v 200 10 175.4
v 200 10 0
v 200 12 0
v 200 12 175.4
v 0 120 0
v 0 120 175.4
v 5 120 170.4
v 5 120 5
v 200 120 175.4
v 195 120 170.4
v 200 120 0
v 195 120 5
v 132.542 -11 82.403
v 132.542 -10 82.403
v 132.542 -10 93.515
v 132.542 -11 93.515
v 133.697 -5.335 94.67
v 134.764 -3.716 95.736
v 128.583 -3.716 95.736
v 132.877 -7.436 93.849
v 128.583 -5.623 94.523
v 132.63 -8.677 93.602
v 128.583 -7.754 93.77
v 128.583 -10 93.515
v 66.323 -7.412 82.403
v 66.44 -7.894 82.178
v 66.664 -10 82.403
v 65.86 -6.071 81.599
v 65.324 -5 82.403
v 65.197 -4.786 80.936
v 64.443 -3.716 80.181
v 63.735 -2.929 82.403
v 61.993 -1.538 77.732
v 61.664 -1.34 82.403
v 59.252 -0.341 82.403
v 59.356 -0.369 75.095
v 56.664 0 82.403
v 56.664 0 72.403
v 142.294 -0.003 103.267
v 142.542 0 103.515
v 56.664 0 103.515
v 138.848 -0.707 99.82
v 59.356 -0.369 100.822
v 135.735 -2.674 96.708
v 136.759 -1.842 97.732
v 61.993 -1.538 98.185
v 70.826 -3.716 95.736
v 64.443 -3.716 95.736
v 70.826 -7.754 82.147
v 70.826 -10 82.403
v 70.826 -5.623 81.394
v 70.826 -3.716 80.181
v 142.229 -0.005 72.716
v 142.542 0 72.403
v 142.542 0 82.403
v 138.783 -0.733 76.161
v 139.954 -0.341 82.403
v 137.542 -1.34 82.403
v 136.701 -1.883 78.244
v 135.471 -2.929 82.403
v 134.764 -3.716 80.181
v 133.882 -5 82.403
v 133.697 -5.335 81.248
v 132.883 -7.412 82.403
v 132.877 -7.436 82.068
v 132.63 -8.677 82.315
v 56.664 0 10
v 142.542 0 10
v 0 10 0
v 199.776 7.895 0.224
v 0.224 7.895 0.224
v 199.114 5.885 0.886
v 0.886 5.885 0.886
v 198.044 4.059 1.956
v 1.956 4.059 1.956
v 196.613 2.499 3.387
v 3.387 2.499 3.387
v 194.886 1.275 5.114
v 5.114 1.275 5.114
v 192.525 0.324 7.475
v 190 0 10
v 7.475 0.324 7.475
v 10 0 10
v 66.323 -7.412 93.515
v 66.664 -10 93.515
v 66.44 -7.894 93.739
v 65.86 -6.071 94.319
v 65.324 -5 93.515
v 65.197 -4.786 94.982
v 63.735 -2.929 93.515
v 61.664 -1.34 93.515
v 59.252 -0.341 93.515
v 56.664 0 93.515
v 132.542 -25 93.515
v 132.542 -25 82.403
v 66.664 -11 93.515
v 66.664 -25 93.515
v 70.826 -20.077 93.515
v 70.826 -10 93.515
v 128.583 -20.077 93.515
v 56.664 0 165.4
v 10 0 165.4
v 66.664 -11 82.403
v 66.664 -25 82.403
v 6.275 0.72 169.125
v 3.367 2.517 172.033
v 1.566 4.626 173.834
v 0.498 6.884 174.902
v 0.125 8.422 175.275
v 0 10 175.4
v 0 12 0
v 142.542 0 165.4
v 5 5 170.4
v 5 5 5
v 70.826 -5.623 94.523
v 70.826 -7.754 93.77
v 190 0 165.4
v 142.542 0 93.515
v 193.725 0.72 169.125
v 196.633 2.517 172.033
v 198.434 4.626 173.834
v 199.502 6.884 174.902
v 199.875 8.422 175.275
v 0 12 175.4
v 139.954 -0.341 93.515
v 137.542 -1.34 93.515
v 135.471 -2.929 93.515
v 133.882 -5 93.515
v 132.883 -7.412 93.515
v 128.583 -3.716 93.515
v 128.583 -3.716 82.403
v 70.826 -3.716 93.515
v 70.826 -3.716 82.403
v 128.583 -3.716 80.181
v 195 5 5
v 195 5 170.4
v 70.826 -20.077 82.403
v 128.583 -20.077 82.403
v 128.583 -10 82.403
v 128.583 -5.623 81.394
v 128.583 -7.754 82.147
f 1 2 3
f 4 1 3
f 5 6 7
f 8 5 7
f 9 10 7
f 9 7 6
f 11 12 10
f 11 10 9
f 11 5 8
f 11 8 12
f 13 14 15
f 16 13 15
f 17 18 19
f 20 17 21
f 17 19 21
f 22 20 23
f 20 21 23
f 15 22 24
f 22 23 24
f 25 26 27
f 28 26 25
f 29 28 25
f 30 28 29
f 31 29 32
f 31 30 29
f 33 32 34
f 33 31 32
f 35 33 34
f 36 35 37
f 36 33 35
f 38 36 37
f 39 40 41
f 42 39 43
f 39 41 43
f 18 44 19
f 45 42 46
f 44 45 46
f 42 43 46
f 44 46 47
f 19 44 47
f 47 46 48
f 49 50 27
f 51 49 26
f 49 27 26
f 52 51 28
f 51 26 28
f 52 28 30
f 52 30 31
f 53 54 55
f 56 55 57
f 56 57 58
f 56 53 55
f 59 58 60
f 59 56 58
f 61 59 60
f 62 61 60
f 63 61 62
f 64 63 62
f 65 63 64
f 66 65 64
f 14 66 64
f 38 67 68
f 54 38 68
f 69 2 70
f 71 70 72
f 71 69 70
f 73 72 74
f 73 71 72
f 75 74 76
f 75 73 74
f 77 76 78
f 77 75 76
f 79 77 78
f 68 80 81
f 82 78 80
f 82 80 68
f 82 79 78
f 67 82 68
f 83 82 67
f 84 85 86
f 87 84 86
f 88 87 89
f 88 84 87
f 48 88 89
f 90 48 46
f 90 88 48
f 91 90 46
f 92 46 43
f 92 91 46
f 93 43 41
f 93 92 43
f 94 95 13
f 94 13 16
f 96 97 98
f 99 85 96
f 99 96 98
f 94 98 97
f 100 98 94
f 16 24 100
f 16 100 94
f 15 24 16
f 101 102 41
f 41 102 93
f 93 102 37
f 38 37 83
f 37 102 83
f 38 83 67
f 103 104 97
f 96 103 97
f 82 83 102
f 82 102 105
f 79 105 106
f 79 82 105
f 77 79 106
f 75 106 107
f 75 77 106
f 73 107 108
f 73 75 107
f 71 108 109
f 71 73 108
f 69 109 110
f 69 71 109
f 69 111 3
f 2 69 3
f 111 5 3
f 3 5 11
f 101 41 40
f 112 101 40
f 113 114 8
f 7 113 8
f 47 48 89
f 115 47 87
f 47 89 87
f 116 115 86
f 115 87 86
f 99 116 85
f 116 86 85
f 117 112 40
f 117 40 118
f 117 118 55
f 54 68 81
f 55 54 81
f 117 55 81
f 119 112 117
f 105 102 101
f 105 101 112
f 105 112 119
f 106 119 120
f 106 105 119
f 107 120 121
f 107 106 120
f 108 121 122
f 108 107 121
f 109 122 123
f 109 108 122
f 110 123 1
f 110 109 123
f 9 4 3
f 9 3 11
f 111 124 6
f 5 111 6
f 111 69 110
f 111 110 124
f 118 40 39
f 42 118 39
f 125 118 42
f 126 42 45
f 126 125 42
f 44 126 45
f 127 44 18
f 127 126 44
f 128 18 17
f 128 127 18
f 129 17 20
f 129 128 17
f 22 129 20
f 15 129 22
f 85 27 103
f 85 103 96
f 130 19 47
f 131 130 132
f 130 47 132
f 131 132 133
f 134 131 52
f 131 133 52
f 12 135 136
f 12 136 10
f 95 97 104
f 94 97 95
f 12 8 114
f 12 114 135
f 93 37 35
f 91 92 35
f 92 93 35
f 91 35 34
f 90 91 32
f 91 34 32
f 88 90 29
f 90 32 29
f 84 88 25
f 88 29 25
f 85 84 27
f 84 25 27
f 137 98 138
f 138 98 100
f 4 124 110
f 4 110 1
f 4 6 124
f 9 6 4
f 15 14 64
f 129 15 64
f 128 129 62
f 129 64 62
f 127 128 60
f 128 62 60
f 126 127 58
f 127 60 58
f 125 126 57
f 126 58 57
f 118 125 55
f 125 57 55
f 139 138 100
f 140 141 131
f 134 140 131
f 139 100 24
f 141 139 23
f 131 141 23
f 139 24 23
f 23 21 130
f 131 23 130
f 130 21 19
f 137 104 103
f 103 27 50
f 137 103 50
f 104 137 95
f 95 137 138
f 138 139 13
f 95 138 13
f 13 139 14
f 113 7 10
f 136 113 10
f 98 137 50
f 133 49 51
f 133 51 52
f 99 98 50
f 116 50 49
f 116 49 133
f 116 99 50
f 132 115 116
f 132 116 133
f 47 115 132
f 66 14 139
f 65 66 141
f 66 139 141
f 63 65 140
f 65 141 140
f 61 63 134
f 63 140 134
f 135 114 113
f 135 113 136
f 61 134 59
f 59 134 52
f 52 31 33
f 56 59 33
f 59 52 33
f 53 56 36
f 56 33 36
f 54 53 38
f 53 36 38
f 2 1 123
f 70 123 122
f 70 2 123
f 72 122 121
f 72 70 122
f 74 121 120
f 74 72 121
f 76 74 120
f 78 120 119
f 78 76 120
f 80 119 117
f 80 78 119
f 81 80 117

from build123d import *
from build123d.topology import SkipClean

# Parameters (mm, degrees)
SKETCH2_W           = 200
SKETCH2_H           = 120
BOSS_EXTRUDE1_DEPTH = 175.4
SHELL1_T            = -5
SKETCH3_W           = 65.878137889
SKETCH3_H           = 11.111975066
BOSS_EXTRUDE2_DEPTH = 25
SKETCH4_W           = 57.75701827
SKETCH4_H           = 16.361203127
CUT_EXTRUDE1_DEPTH  = 13
FILLET1_START       = 82.402628098
FILLET1_DEPTH       = 11.111975066
FILLET1_START_2     = -1
FILLET1_2_DEPTH     = 202
FILLET1_START_3     = 56.664074803
FILLET1_3_DEPTH     = 85.878137889
FILLET1_START_4     = 58.185895168
FILLET1_4_DEPTH     = 12.639911303
FILLET1_START_5     = 128.582824741
FILLET1_5_DEPTH     = 12.437567587
FILLET1_6_DEPTH     = 177


with BuildPart() as part:
    # Sketch2 → Boss-Extrude1 (new body)
    with BuildSketch(Plane.XY):
        with Locations((100, 60)):
            Rectangle(SKETCH2_W, SKETCH2_H)
    extrude(amount=BOSS_EXTRUDE1_DEPTH)

    # Shell1
    shell1_openings = [part.faces().sort_by_distance(p)[0] for p in [
        (100, 120, 87.7),
    ]]
    offset(amount=SHELL1_T, openings=shell1_openings, kind=Kind.INTERSECTION)

    # Sketch3 → Boss-Extrude2 (add)
    with BuildSketch(Plane.XZ):
        with Locations((99.603143748, 87.958615631)):
            Rectangle(SKETCH3_W, SKETCH3_H)
    extrude(amount=BOSS_EXTRUDE2_DEPTH)

    # Sketch4 → Cut-Extrude1 (cut)
    with BuildSketch(Plane.XY.offset(93.514603164)):
        with Locations((99.704315606, -11.896153919)):
            Rectangle(SKETCH4_W, SKETCH4_H)
    extrude(amount=-CUT_EXTRUDE1_DEPTH, mode=Mode.SUBTRACT)

    # Fillet1: read off the stored shape, not the designer's step
    # Fillet1 outline → Fillet1 (add)
    with BuildSketch(Plane.XY.offset(FILLET1_START)):
        with BuildLine():
            Line((142.542212692, 0), (132.542212692, 0))
            Line((132.542212692, 0), (132.542212692, -10))
            ThreePointArc((132.542212692, -10), (135.47114488, -2.928932188), (142.542212692, 0))
        make_face()
        with BuildLine():
            ThreePointArc((56.664074803, 0), (63.735142615, -2.928932188), (66.664074803, -10))
            Line((66.664074803, -10), (66.664074803, 0))
            Line((66.664074803, 0), (56.664074803, 0))
        make_face()
    extrude(amount=FILLET1_DEPTH)

    # Fillet1 2 outline → Fillet1 2 (cut)
    with BuildSketch(Plane.YZ.offset(FILLET1_START_2)):
        with BuildLine():
            Line((0, 175.4), (0, 165.4))
            ThreePointArc((0, 165.4), (2.928932188, 172.471067812), (10, 175.4))
            Line((10, 175.4), (0, 175.4))
        make_face()
        with BuildLine():
            ThreePointArc((10, 0), (2.928932188, 2.928932188), (0, 10))
            Line((0, 10), (0, 0))
            Line((0, 0), (10, 0))
        make_face()
    extrude(amount=FILLET1_2_DEPTH, mode=Mode.SUBTRACT)

    # Fillet1 3 outline → Fillet1 3 (add)
    with BuildSketch(Plane.YZ.offset(FILLET1_START_3)):
        with BuildLine():
            Line((-3.715552355, 82.402628098), (-3.715552355, 80.181170236))
            ThreePointArc((-3.715552355, 80.181170236), (-0.976572811, 76.712820875), (0, 72.402628098))
            Line((0, 72.402628098), (0, 82.402628098))
            Line((0, 82.402628098), (-3.715552355, 82.402628098))
        make_face()
        with BuildLine():
            Line((-3.715552355, 95.736061025), (-3.715552355, 93.514603164))
            Line((-3.715552355, 93.514603164), (0, 93.514603164))
            Line((0, 93.514603164), (0, 103.514603164))
            ThreePointArc((0, 103.514603164), (-0.976572812, 99.204410387), (-3.715552355, 95.736061025))
        make_face()
    extrude(amount=FILLET1_3_DEPTH)

    # Fillet1 4 outline → Fillet1 4 (add)
    with BuildSketch(Plane.YZ.offset(FILLET1_START_4)):
        with BuildLine():
            ThreePointArc((-10, 82.402628098), (-6.667239986, 81.830921193), (-3.715552355, 80.181170236))
            Line((-3.715552355, 80.181170236), (-3.715552355, 82.402628098))
            Line((-3.715552355, 82.402628098), (-10, 82.402628098))
        make_face()
        with BuildLine():
            Line((-10, 93.514603164), (-3.715552355, 93.514603164))
            Line((-3.715552355, 93.514603164), (-3.715552355, 95.736061025))
            ThreePointArc((-3.715552355, 95.736061025), (-6.667239987, 94.086310068), (-10, 93.514603164))
        make_face()
    extrude(amount=FILLET1_4_DEPTH)

    # Fillet1 5 outline → Fillet1 5 (add)
    with BuildSketch(Plane.YZ.offset(FILLET1_START_5)):
        with BuildLine():
            ThreePointArc((-10, 82.402628098), (-6.667239986, 81.830921193), (-3.715552355, 80.181170236))
            Line((-3.715552355, 80.181170236), (-3.715552355, 82.402628098))
            Line((-3.715552355, 82.402628098), (-10, 82.402628098))
        make_face()
        with BuildLine():
            Line((-10, 93.514603164), (-3.715552355, 93.514603164))
            Line((-3.715552355, 93.514603164), (-3.715552355, 95.736061025))
            ThreePointArc((-3.715552355, 95.736061025), (-6.667239987, 94.086310068), (-10, 93.514603164))
        make_face()
    extrude(amount=FILLET1_5_DEPTH)

    # Fillet1 6 outline → Fillet1 6 (cut)
    with SkipClean():  # the faces are left unmerged after this step: merging them gives an invalid solid
        with BuildSketch(Plane.XY.offset(FILLET1_START_2)):
            with BuildLine():
                Line((200, 12), (200, 10))
                ThreePointArc((200, 10), (197.071067812, 2.928932188), (190, 0))
                Line((190, 0), (142.542212692, 0))
                ThreePointArc((142.542212692, 0), (135.47114488, -2.928932188), (132.542212692, -10))
                Line((132.542212692, -10), (132.542212692, -11))
                Line((132.542212692, -11), (201, -11))
                Line((201, -11), (201, 12))
                Line((201, 12), (200, 12))
            make_face()
            with BuildLine():
                Line((0, 10), (0, 12))
                Line((0, 12), (-1, 12))
                Line((-1, 12), (-1, -11))
                Line((-1, -11), (66.664074803, -11))
                Line((66.664074803, -11), (66.664074803, -10))
                ThreePointArc((66.664074803, -10), (63.735142615, -2.928932188), (56.664074803, 0))
                Line((56.664074803, 0), (10, 0))
                ThreePointArc((10, 0), (2.928932188, 2.928932188), (0, 10))
            make_face()
        extrude(amount=FILLET1_6_DEPTH, mode=Mode.SUBTRACT)


solid = part.part
